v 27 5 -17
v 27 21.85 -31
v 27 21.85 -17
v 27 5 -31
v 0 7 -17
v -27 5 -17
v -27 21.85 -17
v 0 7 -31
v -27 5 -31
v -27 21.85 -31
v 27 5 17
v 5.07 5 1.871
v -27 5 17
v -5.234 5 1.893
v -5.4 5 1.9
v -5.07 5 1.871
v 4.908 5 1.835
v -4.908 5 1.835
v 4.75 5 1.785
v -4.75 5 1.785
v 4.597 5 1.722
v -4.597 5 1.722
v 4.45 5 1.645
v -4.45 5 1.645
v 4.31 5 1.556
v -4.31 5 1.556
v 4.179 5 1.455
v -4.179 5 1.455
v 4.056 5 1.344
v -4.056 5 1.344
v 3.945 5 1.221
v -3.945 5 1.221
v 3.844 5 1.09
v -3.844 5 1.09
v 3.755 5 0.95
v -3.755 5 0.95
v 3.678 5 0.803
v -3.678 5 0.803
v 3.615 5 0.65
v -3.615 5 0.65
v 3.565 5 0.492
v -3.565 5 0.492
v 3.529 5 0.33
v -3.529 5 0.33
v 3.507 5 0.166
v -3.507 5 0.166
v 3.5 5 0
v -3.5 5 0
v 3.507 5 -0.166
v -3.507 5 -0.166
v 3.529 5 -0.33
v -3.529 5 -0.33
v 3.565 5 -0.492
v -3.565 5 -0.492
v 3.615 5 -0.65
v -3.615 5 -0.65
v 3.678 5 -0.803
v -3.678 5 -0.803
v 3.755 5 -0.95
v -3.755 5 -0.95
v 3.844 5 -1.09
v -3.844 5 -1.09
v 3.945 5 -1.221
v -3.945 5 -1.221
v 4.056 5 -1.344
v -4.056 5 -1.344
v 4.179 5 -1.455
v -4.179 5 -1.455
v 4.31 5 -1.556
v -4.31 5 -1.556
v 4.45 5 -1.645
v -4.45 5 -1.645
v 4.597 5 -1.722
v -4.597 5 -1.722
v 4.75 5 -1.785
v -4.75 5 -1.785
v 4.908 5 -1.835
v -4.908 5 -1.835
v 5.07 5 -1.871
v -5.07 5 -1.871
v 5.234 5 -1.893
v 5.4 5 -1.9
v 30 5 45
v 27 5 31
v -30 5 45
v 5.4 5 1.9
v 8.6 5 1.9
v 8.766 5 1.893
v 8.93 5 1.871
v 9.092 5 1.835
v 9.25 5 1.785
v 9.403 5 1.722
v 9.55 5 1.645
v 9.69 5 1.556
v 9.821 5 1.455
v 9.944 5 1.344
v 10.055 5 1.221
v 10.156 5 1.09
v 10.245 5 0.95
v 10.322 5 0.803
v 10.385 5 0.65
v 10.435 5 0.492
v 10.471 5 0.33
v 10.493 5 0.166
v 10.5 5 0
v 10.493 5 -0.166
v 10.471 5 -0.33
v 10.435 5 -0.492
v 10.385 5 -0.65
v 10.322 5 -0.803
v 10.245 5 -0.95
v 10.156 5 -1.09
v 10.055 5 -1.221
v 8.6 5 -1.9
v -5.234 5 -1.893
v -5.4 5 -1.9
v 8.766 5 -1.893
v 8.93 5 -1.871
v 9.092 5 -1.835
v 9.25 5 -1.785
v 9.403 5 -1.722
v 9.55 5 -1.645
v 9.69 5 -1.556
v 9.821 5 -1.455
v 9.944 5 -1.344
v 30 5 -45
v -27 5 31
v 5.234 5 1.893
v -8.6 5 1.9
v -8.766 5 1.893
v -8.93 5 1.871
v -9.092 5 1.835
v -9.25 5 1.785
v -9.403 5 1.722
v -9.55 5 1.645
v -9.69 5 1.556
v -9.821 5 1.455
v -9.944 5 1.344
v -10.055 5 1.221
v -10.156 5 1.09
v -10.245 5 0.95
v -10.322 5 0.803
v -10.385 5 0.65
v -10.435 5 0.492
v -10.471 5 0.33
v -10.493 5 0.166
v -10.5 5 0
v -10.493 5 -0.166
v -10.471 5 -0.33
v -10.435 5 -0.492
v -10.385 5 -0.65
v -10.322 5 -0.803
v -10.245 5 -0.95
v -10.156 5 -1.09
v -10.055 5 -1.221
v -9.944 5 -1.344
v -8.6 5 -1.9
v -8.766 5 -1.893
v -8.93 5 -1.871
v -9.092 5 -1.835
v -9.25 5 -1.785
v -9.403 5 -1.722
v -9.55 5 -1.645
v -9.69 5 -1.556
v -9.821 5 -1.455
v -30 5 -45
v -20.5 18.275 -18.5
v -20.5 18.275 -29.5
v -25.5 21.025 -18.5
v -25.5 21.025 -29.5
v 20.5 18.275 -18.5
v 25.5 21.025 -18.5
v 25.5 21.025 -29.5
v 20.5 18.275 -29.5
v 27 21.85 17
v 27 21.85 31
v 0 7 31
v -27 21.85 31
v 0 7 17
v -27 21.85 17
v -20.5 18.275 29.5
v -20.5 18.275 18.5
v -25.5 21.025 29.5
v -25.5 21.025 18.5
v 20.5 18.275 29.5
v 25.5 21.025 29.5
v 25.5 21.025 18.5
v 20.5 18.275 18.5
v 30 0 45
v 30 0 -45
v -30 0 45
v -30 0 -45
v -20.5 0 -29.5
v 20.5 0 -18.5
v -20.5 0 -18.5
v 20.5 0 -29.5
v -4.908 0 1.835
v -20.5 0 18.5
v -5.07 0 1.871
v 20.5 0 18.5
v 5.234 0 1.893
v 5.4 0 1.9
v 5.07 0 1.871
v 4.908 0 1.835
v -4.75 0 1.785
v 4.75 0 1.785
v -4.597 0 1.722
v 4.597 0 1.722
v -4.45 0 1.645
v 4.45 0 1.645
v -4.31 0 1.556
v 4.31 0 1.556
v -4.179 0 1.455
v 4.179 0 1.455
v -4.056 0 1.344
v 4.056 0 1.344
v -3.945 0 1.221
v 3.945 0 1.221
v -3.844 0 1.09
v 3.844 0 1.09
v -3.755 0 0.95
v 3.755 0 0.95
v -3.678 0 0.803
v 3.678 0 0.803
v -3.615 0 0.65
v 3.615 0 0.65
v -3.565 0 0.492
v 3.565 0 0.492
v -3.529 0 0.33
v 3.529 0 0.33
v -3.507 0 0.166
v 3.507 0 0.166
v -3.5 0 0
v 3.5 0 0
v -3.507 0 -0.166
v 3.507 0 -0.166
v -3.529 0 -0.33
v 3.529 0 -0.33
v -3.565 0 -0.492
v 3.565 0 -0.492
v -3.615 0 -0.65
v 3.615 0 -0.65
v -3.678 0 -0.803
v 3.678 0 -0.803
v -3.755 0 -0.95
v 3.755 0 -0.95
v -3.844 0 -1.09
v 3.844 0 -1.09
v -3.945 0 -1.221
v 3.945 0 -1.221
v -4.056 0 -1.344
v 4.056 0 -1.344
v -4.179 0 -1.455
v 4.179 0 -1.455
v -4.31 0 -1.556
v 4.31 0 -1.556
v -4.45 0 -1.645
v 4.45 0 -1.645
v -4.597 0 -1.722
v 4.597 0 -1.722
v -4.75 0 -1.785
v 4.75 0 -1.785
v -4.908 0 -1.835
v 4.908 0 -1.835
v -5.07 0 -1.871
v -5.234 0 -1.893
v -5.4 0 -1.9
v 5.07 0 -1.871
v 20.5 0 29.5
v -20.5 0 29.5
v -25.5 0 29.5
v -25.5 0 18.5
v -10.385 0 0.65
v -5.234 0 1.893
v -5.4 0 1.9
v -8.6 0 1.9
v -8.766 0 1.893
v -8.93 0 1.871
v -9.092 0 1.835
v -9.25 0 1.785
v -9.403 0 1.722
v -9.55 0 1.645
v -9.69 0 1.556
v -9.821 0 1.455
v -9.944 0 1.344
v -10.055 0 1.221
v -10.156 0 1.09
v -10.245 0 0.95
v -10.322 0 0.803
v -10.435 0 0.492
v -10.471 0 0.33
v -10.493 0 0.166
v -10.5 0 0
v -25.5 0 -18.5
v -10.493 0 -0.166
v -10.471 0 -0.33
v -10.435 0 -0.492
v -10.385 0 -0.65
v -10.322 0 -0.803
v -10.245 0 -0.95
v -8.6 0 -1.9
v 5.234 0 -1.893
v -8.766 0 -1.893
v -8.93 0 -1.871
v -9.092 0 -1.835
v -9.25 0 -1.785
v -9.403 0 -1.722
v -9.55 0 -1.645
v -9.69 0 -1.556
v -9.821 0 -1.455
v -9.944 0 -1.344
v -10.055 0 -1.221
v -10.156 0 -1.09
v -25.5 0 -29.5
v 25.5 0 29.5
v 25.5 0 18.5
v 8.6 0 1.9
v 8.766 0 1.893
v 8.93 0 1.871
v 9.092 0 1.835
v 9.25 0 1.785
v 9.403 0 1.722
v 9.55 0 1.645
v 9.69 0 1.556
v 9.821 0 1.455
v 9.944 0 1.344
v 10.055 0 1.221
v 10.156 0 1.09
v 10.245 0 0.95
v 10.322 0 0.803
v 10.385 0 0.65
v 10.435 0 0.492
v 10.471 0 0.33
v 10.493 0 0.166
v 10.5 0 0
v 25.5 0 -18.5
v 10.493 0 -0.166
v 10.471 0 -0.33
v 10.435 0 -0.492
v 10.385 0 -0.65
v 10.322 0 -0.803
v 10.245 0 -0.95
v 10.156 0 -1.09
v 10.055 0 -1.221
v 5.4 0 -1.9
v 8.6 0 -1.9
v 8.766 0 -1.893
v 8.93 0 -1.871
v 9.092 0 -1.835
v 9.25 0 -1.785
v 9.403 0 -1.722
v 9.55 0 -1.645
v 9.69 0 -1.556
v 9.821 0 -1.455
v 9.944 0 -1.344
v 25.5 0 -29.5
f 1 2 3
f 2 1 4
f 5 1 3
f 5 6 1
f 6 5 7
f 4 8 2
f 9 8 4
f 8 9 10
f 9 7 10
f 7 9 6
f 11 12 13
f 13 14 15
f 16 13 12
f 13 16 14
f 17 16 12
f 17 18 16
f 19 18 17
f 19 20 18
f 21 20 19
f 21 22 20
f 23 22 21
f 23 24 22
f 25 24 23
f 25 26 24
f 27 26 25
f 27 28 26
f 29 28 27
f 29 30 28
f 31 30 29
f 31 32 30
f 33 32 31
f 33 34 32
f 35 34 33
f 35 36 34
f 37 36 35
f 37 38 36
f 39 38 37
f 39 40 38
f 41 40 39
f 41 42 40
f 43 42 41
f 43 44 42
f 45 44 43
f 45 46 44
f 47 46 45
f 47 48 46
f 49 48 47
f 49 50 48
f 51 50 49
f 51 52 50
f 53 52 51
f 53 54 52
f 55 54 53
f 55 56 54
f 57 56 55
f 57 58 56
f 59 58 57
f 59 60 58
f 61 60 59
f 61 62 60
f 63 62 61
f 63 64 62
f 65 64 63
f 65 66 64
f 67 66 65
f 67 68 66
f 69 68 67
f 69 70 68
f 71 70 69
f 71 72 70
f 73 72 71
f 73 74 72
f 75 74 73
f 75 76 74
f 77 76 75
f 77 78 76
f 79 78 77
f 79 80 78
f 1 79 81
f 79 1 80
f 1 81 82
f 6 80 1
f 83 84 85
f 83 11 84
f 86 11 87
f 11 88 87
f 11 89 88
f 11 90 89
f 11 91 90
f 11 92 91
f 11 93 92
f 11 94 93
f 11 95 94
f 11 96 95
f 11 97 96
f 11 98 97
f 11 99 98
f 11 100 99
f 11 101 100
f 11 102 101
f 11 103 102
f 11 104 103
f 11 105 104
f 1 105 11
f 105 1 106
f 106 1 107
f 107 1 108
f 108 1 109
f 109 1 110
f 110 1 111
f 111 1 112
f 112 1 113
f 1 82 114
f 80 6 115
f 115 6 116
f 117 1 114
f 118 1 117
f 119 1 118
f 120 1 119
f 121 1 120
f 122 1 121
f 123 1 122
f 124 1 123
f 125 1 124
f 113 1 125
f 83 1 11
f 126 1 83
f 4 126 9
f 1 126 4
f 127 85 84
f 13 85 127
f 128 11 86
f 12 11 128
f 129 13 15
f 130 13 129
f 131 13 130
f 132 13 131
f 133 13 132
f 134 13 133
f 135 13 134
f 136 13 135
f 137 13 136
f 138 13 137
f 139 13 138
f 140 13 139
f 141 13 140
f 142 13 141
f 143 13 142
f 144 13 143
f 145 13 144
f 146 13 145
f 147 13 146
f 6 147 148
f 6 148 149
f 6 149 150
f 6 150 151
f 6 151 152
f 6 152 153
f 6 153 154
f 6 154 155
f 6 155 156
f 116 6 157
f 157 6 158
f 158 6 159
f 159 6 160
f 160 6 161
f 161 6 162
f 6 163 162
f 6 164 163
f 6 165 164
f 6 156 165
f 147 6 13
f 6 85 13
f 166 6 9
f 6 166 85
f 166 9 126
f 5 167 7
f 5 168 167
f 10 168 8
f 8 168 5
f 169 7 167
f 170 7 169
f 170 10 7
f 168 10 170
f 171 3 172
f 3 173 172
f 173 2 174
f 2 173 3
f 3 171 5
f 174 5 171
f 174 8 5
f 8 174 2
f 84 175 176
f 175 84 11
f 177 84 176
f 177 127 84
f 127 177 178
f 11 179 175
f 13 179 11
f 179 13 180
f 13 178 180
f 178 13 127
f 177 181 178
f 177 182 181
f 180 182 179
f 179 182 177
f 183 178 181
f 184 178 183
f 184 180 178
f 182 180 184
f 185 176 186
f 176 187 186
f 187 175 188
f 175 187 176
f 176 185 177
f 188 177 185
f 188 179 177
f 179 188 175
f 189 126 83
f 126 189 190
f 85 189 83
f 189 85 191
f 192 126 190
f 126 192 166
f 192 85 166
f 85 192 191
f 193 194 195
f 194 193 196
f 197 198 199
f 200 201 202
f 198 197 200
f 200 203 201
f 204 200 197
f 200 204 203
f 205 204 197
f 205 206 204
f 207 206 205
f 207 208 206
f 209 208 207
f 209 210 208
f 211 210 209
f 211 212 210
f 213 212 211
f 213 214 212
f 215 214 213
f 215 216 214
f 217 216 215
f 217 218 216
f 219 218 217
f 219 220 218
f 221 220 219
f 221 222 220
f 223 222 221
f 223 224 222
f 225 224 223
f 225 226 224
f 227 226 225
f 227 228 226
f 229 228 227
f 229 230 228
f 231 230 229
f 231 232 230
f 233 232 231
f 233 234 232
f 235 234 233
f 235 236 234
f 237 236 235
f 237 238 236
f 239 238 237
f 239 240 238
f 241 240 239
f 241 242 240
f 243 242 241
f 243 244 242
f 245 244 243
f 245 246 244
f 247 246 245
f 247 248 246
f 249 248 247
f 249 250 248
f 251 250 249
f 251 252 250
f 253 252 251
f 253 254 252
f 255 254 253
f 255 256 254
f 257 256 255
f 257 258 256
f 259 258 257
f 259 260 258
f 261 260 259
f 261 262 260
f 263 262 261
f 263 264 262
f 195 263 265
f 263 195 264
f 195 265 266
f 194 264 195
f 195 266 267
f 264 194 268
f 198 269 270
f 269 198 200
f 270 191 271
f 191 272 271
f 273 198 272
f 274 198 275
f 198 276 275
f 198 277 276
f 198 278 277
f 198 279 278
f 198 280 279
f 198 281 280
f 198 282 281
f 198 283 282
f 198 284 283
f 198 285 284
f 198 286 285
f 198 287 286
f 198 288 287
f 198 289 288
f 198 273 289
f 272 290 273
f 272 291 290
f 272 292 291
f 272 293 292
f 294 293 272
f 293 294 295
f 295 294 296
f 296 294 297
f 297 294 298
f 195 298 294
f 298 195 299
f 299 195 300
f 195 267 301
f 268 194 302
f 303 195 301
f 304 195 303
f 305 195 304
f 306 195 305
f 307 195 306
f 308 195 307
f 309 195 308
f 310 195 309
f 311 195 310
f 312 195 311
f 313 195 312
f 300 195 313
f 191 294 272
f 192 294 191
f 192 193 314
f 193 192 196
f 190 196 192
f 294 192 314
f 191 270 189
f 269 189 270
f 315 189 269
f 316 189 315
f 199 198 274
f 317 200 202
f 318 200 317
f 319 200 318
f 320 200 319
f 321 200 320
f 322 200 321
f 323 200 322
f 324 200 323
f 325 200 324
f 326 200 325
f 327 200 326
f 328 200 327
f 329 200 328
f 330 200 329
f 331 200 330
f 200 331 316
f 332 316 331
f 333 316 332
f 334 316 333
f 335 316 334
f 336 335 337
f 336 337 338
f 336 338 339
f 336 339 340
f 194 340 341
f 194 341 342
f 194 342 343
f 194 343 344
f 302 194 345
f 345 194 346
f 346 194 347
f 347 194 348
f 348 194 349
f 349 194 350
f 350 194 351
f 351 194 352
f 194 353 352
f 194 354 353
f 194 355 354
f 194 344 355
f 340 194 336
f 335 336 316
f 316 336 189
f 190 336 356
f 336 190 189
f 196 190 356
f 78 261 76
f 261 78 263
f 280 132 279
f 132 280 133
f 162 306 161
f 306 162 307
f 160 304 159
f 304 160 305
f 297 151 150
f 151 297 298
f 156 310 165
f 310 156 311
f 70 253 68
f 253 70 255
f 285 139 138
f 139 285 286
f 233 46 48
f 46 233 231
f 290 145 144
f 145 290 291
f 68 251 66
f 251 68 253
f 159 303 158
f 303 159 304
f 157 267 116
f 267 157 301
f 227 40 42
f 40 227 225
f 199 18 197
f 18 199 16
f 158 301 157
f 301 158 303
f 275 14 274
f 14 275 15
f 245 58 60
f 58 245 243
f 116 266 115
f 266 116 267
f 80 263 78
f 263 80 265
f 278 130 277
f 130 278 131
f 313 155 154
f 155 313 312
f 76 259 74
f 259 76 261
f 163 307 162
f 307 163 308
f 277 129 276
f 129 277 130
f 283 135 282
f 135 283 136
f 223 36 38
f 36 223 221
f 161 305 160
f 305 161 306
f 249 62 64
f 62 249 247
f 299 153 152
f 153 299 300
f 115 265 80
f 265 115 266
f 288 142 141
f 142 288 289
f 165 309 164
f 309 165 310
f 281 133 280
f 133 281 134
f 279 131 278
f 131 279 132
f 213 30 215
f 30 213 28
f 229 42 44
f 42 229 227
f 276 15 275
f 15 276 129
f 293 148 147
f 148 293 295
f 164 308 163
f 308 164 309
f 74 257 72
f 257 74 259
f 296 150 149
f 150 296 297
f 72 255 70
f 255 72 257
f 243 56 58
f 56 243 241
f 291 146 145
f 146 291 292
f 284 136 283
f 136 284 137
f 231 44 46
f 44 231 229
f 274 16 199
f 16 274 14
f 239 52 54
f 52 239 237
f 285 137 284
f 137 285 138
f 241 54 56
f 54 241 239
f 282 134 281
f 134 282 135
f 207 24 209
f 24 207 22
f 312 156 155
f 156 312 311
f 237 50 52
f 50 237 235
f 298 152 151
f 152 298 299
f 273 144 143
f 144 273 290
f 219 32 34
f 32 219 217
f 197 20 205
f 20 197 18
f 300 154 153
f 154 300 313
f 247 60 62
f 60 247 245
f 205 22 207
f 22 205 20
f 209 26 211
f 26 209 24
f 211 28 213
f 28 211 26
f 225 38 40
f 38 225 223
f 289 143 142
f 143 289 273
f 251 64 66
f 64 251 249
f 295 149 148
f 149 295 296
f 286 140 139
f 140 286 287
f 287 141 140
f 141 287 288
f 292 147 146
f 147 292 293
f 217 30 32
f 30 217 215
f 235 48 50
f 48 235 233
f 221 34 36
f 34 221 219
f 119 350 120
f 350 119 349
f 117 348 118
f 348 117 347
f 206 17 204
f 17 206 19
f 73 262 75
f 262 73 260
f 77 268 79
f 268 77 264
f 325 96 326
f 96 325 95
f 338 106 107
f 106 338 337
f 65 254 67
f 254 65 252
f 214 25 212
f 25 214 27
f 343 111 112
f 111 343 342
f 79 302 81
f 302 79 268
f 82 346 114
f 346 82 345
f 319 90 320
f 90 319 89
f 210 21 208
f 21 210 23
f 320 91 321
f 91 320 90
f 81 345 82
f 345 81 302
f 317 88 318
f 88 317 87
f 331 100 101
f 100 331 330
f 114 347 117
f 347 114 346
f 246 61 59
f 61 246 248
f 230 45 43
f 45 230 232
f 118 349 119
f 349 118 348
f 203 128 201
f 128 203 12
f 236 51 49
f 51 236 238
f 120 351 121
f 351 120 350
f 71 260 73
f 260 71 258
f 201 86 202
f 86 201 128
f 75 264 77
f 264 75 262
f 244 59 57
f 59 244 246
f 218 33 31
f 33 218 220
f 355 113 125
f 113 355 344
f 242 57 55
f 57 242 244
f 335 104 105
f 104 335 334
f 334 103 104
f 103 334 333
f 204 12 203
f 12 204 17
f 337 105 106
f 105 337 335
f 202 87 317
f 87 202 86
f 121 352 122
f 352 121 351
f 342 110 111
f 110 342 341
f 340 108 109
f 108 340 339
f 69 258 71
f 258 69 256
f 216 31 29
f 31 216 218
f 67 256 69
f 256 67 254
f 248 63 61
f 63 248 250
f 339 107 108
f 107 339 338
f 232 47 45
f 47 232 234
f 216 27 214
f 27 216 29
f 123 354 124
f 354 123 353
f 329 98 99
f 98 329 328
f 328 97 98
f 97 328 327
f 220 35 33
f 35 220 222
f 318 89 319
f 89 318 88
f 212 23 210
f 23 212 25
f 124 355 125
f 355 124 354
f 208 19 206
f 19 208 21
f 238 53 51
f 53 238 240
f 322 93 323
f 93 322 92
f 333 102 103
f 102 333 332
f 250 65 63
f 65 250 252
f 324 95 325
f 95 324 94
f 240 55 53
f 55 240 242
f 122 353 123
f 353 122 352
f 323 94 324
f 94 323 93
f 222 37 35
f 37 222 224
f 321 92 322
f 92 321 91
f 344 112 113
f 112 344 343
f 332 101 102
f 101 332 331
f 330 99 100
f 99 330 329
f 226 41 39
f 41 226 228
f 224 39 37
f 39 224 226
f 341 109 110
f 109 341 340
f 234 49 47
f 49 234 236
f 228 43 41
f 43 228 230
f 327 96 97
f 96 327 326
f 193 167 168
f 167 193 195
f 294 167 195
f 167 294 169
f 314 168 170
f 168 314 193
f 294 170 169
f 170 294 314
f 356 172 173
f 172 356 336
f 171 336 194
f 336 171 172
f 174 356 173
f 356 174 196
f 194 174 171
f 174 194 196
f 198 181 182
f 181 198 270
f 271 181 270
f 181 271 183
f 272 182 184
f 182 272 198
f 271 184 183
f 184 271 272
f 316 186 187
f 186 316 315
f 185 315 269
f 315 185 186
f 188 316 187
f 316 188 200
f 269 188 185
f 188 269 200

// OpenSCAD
// Ender 3 V2 universal microscope adapter — quick-test version
// Coordinate system when installed:
//   X = carriage left/right, Y = forward from carriage, Z = vertical.
// Print with the flat rear face on the build plate.

$fn = 72;

plate_width = 60;
plate_height = 90;
plate_thickness = 5;

// Stock MK8 hot-end mounting screws. The slots tolerate small carriage revisions.
mount_spacing = 14;
mount_slot_length = 7;
mount_hole_diameter = 3.8;

// Two V-cradles support a wide range of cylindrical optical tubes.
cradle_width = 54;
cradle_depth = 22;
cradle_band_height = 14;
cradle_centres = [-24, 24];
v_vertex_y = 7;
v_slope = 0.55;

// Slots accept heavy 7.6 mm cable ties. Use 300 mm ties or longer.
tie_slot_width = 5;
tie_slot_height = 11;
tie_slot_x = 23;

module rounded_slot_x(length, diameter, depth) {
    hull() {
        translate([-length/2 + diameter/2, 0, 0])
            rotate([90,0,0]) cylinder(h=depth, d=diameter, center=true);
        translate([ length/2 - diameter/2, 0, 0])
            rotate([90,0,0]) cylinder(h=depth, d=diameter, center=true);
    }
}

module cradle_band(zc) {
    // The V-shaped cutout opens toward +Y and needs no print support.
    difference() {
        translate([-cradle_width/2, plate_thickness, zc-cradle_band_height/2])
            cube([cradle_width, cradle_depth-plate_thickness, cradle_band_height]);

        // Large triangular prism forming the V seat.
        translate([0, v_vertex_y, zc-cradle_band_height])
            linear_extrude(height=cradle_band_height*3)
                polygon(points=[
                    [0,0],
                    [80,80*v_slope],
                    [-80,80*v_slope]
                ]);
    }
}

module adapter() {
    difference() {
        union() {
            translate([-plate_width/2, 0, -plate_height/2])
                cube([plate_width, plate_thickness, plate_height]);
            for (zc = cradle_centres) cradle_band(zc);
        }

        // Two M3 horizontal adjustment slots, nominally 14 mm apart.
        for (xc = [-mount_spacing/2, mount_spacing/2])
            translate([xc, plate_thickness/2, 0])
                rounded_slot_x(mount_slot_length, mount_hole_diameter,
                               plate_thickness+4);

        // Paired tie slots at each cradle level.
        for (zc = cradle_centres)
            for (xc = [-tie_slot_x, tie_slot_x])
                translate([xc-tie_slot_width/2, -1, zc-tie_slot_height/2])
                    cube([tie_slot_width, cradle_depth+2, tie_slot_height]);
    }
}

adapter();
